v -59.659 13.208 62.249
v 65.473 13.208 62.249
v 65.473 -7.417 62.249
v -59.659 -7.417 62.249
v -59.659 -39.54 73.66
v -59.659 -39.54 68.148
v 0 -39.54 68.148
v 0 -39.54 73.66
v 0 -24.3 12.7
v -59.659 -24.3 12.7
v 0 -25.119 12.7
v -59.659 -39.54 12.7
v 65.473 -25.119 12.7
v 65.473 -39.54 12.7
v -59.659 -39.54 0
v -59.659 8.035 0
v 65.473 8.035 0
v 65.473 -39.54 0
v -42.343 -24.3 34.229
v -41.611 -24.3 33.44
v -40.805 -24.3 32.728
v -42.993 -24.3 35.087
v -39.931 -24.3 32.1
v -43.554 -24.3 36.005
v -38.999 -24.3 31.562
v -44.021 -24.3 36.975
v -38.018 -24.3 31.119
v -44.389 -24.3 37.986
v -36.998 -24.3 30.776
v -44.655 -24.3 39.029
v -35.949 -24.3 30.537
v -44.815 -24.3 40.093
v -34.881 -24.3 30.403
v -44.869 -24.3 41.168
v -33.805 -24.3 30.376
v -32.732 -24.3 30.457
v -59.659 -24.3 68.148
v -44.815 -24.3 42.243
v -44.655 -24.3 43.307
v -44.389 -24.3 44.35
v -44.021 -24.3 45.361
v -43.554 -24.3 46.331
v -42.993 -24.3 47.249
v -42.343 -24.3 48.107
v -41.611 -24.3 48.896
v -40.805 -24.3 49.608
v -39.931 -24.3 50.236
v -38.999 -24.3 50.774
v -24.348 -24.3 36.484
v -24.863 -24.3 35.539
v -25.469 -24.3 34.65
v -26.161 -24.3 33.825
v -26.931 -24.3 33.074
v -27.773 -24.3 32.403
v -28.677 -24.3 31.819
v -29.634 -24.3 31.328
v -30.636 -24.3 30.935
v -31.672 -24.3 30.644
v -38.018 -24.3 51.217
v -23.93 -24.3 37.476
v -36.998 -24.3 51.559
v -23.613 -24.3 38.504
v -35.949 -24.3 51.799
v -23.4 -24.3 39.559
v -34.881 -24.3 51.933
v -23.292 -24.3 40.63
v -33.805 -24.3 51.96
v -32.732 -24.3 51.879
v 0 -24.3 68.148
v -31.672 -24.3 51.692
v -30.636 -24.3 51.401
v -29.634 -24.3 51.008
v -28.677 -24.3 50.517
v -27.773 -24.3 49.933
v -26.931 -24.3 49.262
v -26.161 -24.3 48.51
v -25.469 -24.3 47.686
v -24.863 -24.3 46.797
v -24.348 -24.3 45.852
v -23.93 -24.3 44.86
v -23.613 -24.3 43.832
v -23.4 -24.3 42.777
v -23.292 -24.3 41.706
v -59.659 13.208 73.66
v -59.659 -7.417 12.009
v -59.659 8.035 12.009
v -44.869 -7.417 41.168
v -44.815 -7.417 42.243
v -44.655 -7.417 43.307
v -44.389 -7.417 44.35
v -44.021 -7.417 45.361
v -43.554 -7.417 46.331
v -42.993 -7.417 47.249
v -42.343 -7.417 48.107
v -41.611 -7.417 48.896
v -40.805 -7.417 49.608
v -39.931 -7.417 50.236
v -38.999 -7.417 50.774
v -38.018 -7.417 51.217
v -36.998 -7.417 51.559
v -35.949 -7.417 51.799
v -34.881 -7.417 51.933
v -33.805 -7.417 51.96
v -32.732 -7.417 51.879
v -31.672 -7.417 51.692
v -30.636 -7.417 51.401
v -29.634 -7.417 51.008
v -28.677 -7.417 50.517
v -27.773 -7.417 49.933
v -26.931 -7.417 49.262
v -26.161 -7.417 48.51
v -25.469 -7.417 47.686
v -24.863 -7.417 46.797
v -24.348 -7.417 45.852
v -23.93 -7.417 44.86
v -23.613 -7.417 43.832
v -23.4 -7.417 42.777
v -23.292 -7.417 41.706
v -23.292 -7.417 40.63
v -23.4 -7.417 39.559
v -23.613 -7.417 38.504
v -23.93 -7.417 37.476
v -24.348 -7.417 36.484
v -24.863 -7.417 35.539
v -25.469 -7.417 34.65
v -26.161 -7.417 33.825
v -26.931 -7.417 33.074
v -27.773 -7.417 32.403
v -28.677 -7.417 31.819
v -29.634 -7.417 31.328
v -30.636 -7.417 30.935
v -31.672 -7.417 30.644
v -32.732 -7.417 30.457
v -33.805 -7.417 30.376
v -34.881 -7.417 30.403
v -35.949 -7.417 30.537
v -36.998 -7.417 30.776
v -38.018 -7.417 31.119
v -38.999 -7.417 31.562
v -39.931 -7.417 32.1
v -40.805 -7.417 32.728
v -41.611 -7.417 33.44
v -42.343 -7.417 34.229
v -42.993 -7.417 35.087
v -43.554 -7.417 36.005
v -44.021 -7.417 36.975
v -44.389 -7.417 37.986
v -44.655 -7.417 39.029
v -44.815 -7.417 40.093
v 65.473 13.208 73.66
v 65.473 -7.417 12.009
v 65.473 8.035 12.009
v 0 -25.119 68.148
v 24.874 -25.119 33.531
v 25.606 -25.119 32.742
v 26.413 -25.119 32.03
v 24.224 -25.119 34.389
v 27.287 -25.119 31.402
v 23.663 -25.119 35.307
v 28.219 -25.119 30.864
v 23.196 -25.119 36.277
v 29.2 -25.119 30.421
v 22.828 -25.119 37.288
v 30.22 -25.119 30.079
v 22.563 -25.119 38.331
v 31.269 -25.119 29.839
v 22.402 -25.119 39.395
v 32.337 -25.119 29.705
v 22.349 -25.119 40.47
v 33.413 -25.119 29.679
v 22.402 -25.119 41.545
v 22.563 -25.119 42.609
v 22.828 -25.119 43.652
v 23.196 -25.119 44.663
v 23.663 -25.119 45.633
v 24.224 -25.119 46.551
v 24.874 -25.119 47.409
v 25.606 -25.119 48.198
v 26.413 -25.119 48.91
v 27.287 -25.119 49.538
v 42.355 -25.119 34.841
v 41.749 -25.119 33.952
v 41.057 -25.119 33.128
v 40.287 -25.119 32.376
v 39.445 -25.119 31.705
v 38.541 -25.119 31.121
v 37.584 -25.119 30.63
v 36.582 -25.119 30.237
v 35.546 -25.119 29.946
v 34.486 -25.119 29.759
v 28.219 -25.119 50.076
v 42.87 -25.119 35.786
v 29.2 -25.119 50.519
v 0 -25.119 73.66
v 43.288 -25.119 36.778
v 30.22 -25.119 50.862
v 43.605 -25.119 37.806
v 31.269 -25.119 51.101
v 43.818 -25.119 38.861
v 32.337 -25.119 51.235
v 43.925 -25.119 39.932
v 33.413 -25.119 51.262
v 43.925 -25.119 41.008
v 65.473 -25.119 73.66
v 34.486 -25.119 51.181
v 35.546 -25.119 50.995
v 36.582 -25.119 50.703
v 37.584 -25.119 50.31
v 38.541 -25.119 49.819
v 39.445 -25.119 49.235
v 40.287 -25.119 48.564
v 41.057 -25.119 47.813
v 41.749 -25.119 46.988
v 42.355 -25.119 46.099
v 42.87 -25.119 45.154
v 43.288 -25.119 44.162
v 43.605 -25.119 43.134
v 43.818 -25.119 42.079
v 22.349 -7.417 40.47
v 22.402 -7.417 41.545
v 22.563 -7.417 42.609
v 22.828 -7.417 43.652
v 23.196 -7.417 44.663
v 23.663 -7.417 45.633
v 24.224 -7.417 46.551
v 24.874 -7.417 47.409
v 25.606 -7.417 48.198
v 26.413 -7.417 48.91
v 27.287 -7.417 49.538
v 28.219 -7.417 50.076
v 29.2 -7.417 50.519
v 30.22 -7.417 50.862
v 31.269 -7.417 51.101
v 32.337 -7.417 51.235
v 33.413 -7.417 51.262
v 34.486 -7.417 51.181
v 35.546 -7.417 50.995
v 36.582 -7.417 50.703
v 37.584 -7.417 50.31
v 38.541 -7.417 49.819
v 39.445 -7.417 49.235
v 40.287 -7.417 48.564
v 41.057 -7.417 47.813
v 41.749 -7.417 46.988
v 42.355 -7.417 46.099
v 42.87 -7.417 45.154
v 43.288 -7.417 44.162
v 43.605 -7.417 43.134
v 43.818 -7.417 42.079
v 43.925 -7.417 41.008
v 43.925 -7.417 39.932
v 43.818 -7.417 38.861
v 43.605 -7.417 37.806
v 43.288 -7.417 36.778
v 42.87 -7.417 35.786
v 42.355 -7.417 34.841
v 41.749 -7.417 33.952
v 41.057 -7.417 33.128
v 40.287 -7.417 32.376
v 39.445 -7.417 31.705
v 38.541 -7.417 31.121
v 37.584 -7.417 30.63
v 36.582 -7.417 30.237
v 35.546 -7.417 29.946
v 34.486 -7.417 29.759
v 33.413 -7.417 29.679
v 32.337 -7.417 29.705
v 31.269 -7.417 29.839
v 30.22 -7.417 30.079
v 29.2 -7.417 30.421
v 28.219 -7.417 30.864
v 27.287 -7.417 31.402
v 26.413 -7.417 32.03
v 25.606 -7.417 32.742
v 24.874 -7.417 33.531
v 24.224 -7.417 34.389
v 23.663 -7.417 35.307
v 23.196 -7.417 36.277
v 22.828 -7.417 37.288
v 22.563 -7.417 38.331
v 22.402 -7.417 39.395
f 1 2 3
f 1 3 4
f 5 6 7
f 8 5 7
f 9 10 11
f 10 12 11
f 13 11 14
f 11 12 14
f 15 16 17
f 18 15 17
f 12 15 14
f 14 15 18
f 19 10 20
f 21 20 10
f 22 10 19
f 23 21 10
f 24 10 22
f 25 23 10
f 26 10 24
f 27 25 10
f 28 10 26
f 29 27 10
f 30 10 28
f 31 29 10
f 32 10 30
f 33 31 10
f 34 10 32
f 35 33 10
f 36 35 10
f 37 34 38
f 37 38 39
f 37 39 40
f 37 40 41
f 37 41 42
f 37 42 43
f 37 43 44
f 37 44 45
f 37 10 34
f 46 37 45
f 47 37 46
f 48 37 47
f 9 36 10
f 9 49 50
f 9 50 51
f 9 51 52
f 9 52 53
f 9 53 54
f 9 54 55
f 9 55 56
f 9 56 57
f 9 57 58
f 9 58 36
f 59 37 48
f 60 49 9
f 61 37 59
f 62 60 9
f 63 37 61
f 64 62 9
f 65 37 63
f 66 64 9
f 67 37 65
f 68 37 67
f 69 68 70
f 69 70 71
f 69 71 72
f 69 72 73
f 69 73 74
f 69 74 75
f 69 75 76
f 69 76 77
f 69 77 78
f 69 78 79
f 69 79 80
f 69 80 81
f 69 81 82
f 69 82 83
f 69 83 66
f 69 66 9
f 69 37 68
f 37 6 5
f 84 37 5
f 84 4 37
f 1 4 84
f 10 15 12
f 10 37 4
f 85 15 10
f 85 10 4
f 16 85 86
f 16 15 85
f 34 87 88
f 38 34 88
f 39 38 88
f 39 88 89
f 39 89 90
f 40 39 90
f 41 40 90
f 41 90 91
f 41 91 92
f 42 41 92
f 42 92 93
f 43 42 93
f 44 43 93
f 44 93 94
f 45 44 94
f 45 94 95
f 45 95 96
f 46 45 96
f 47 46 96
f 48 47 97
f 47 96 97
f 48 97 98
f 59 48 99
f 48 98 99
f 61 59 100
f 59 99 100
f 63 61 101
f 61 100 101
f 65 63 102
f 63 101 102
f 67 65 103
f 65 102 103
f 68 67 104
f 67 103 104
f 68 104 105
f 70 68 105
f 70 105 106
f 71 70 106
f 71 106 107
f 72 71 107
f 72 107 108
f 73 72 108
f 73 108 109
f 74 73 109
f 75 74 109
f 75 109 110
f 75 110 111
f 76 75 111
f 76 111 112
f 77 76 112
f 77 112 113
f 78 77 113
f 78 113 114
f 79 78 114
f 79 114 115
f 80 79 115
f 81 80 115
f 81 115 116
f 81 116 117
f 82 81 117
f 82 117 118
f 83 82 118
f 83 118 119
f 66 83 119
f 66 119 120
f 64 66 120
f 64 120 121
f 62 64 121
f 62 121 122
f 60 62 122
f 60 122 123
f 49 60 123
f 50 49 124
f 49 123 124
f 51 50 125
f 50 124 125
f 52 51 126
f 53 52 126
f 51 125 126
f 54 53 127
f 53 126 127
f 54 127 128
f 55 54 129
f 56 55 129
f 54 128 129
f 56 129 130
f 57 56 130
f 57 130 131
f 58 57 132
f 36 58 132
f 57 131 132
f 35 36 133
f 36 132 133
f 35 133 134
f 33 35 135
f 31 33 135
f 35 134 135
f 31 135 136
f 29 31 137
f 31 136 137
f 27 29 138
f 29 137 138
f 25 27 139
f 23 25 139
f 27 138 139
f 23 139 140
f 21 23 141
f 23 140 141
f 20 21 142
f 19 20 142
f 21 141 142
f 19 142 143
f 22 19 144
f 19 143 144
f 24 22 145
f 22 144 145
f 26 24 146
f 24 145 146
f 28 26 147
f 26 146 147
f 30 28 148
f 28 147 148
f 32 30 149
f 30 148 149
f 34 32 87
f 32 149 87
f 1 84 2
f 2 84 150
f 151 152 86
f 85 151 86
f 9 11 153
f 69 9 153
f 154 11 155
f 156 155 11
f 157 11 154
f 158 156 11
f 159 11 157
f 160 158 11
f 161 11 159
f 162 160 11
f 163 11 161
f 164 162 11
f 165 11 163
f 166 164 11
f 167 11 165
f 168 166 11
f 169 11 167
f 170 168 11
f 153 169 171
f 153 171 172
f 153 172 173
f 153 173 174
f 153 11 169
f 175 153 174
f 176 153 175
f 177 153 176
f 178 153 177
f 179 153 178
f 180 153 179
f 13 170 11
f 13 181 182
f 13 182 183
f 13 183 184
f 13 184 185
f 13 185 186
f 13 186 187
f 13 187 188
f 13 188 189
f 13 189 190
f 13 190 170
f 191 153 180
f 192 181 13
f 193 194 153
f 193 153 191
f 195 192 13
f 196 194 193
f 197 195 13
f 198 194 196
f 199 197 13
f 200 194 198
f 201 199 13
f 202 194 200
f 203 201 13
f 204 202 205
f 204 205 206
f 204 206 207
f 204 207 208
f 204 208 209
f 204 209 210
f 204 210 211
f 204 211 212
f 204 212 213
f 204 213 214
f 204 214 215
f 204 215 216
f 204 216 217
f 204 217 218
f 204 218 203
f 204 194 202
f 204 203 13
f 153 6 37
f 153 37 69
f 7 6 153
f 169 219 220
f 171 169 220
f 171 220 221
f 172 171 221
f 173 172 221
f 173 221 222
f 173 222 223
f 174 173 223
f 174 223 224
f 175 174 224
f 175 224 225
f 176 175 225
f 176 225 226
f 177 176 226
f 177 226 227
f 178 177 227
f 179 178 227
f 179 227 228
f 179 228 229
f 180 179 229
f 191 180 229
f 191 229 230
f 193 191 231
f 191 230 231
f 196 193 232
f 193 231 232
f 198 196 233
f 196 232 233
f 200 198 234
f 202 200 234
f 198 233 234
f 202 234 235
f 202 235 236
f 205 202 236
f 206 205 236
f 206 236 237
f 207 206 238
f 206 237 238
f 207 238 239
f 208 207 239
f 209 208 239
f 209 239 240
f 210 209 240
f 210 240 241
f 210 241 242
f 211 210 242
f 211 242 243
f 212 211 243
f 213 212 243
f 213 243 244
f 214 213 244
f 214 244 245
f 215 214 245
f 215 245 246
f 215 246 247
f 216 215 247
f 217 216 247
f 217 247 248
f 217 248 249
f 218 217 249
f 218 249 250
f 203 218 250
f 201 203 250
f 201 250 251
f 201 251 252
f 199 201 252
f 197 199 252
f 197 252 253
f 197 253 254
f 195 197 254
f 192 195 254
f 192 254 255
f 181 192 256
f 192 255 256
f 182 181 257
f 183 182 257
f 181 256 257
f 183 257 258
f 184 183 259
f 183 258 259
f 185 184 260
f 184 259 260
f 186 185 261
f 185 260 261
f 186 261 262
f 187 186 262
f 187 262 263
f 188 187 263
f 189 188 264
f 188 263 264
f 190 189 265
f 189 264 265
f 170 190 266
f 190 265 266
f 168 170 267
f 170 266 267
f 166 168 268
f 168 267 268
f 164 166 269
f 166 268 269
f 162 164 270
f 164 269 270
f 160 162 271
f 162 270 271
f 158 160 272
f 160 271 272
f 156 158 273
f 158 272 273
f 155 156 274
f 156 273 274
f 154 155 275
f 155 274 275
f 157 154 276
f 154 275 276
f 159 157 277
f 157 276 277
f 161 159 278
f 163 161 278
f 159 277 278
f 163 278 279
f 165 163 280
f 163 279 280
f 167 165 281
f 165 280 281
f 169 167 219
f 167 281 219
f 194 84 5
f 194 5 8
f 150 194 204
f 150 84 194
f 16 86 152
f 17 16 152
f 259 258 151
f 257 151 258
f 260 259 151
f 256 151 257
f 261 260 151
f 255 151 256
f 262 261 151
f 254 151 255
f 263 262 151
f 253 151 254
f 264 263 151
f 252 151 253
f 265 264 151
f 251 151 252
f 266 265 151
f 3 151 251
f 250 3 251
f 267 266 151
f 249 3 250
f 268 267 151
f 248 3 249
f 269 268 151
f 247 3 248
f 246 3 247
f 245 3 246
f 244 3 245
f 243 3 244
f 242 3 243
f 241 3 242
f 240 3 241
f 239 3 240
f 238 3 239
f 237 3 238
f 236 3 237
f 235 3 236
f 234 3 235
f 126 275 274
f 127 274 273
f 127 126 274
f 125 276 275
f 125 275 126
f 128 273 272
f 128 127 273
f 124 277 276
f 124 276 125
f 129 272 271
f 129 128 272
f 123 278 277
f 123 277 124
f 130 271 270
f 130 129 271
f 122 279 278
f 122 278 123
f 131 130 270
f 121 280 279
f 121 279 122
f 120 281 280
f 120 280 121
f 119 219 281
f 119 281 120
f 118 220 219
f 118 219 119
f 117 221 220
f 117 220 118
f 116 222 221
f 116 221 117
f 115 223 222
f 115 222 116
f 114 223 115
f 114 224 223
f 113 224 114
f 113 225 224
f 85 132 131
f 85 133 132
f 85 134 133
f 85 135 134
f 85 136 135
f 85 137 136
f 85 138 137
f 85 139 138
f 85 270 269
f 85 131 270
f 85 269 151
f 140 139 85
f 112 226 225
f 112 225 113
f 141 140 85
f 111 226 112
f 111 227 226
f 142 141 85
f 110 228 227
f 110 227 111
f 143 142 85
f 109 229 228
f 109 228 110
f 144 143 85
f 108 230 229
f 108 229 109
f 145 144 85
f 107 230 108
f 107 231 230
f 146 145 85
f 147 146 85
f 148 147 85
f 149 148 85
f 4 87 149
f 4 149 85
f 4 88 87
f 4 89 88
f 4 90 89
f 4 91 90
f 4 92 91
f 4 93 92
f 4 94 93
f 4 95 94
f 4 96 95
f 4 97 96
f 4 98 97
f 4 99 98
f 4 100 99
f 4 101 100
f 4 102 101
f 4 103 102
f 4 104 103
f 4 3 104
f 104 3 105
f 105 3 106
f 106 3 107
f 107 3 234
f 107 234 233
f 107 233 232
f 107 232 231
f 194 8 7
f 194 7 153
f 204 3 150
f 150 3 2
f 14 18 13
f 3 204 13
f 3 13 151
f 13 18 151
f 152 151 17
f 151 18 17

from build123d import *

# Parameters (mm, degrees)
F0_W      = 125.1319237053
F0_H      = 67.682877183
F1_DEPTH  = 12.7
F2_W      = 125.1319237053
F2_H      = 67.682877183
F3_DEPTH  = 60.96
F4_W      = 65.4733031988
F4_H      = 14.4204068929
F5_DEPTH  = 60.96
F6_W      = 59.6586205065
F6_H      = 55.4480541825
F7_DEPTH  = 10.16
F8_DEPTH  = 5.08
F9_DEPTH  = 5.08
F10_W     = 125.1319237053
F10_H     = 50.2397883683
F11_DEPTH = 35.56
F12_W     = 125.1319237053
F12_H     = 20.1084222645
F13_DEPTH = 25.4
F14_W     = 125.1319237053
F14_H     = 8.8336318731
F15_DEPTH = 25.4
F16_W     = 125.1319237053
F16_H     = 6.1016352847
F17_DEPTH = 25.4
F19_D     = 21.59
F21_D     = 21.59


with BuildPart() as f1:
    # F0 (on Top) → F1 (new body)
    with BuildSketch(Plane.XY):
        with Locations((2.9073413461, -5.6983865798)):
            Rectangle(F0_W, F0_H)
    extrude(amount=F1_DEPTH)

    # F2 (on face) → F3 (join)
    with BuildSketch(Plane.XY.offset(12.7)):
        with Locations((2.9073413461, -5.6983865798)):
            Rectangle(F2_W, F2_H)
    extrude(amount=F3_DEPTH)

    # F4 (on face) → F5 (cut)
    with BuildSketch(Plane.XY.offset(73.66)):
        with Locations((32.7366515994, -32.3296217248)):
            Rectangle(F4_W, F4_H)
    extrude(amount=-F5_DEPTH, mode=Mode.SUBTRACT)

    # F6 (on face) → F7 (cut)
    with BuildSketch(Plane.XZ.offset(39.5398251712)):
        with Locations((-29.8293102533, 40.4240270913)):
            Rectangle(F6_W, F6_H)
    extrude(amount=-F7_DEPTH, mode=Mode.SUBTRACT)

    # F8 (add): a face of the model
    f8_faces = [f1.faces().sort_by_distance(p)[0] for p in [
        (32.7366515994, -25.1194182783, 43.18),
    ]]
    extrude(f8_faces, amount=F8_DEPTH)

    # F9 (cut): faces of the model
    f9_faces = [f1.faces().sort_by_distance(p)[0] for p in [
        (32.7366515994, -30.1994182783, 43.18),
        (-29.8293102533, -29.3798251712, 40.4240270913),
    ]]
    extrude(f9_faces, amount=-F9_DEPTH, mode=Mode.SUBTRACT)

    # F10 (on face) → F11 (cut)
    with BuildSketch(Plane(origin=(0, 28.1430520117, 0), x_dir=(-1, 0, 0), z_dir=(0, 1, 0))):
        with Locations((-2.9073413461, 37.1288014576)):
            Rectangle(F10_W, F10_H)
    extrude(amount=-F11_DEPTH, mode=Mode.SUBTRACT)

    # F12 (on face) → F13 (cut)
    with BuildSketch(Plane.XY.offset(12.0089072734)):
        with Locations((2.9073413461, 18.0888408795)):
            Rectangle(F12_W, F12_H)
    extrude(amount=-F13_DEPTH, mode=Mode.SUBTRACT)

    # F14 (on face) → F15 (cut)
    with BuildSketch(Plane.XY.offset(73.66)):
        with Locations((2.9073413461, 23.7262360752)):
            Rectangle(F14_W, F14_H)
    extrude(amount=-F15_DEPTH, mode=Mode.SUBTRACT)

    # F16 (on face) → F17 (cut)
    with BuildSketch(Plane.XY.offset(73.66)):
        with Locations((2.9073413461, 16.2586024962)):
            Rectangle(F16_W, F16_H)
    extrude(amount=-F17_DEPTH, mode=Mode.SUBTRACT)

    # F19 (through all)
    with Locations(Plane.XZ.offset(24.2998251712)):
        with Locations((-34.0740270913, 41.1679372191)):
            Hole(F19_D / 2)

    # F21 (through all)
    with Locations(Plane.XZ.offset(25.1194182783)):
        with Locations((33.1436805427, 40.4701754451)):
            Hole(F21_D / 2)


solid = f1.part
